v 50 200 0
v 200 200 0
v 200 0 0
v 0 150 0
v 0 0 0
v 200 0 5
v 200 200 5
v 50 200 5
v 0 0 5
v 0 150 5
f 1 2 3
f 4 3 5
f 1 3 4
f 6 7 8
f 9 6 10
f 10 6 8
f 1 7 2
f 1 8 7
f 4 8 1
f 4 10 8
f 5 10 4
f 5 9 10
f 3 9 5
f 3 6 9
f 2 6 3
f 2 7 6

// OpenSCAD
moduleSize = 200; // [50:350]
rows = 1; // [1:20]

module openLuggage(index) {
    translate([index * moduleSize, 0, 0])
        cube([moduleSize, moduleSize, 5], center=false);
}

module cornerBase() {
    linear_extrude(height=5)
        polygon(points=[[0,0], [moduleSize ,0], [moduleSize,moduleSize], [50,moduleSize], [0,moduleSize-50]]);
}

for (r = [0:rows-1])
    if (r == 0)
        cornerBase();

    else if (r == rows -1)
        mirror([1,0,0]) translate([-moduleSize * (r + 1), 0, 0]) cornerBase();
    else
        openLuggage(r);
